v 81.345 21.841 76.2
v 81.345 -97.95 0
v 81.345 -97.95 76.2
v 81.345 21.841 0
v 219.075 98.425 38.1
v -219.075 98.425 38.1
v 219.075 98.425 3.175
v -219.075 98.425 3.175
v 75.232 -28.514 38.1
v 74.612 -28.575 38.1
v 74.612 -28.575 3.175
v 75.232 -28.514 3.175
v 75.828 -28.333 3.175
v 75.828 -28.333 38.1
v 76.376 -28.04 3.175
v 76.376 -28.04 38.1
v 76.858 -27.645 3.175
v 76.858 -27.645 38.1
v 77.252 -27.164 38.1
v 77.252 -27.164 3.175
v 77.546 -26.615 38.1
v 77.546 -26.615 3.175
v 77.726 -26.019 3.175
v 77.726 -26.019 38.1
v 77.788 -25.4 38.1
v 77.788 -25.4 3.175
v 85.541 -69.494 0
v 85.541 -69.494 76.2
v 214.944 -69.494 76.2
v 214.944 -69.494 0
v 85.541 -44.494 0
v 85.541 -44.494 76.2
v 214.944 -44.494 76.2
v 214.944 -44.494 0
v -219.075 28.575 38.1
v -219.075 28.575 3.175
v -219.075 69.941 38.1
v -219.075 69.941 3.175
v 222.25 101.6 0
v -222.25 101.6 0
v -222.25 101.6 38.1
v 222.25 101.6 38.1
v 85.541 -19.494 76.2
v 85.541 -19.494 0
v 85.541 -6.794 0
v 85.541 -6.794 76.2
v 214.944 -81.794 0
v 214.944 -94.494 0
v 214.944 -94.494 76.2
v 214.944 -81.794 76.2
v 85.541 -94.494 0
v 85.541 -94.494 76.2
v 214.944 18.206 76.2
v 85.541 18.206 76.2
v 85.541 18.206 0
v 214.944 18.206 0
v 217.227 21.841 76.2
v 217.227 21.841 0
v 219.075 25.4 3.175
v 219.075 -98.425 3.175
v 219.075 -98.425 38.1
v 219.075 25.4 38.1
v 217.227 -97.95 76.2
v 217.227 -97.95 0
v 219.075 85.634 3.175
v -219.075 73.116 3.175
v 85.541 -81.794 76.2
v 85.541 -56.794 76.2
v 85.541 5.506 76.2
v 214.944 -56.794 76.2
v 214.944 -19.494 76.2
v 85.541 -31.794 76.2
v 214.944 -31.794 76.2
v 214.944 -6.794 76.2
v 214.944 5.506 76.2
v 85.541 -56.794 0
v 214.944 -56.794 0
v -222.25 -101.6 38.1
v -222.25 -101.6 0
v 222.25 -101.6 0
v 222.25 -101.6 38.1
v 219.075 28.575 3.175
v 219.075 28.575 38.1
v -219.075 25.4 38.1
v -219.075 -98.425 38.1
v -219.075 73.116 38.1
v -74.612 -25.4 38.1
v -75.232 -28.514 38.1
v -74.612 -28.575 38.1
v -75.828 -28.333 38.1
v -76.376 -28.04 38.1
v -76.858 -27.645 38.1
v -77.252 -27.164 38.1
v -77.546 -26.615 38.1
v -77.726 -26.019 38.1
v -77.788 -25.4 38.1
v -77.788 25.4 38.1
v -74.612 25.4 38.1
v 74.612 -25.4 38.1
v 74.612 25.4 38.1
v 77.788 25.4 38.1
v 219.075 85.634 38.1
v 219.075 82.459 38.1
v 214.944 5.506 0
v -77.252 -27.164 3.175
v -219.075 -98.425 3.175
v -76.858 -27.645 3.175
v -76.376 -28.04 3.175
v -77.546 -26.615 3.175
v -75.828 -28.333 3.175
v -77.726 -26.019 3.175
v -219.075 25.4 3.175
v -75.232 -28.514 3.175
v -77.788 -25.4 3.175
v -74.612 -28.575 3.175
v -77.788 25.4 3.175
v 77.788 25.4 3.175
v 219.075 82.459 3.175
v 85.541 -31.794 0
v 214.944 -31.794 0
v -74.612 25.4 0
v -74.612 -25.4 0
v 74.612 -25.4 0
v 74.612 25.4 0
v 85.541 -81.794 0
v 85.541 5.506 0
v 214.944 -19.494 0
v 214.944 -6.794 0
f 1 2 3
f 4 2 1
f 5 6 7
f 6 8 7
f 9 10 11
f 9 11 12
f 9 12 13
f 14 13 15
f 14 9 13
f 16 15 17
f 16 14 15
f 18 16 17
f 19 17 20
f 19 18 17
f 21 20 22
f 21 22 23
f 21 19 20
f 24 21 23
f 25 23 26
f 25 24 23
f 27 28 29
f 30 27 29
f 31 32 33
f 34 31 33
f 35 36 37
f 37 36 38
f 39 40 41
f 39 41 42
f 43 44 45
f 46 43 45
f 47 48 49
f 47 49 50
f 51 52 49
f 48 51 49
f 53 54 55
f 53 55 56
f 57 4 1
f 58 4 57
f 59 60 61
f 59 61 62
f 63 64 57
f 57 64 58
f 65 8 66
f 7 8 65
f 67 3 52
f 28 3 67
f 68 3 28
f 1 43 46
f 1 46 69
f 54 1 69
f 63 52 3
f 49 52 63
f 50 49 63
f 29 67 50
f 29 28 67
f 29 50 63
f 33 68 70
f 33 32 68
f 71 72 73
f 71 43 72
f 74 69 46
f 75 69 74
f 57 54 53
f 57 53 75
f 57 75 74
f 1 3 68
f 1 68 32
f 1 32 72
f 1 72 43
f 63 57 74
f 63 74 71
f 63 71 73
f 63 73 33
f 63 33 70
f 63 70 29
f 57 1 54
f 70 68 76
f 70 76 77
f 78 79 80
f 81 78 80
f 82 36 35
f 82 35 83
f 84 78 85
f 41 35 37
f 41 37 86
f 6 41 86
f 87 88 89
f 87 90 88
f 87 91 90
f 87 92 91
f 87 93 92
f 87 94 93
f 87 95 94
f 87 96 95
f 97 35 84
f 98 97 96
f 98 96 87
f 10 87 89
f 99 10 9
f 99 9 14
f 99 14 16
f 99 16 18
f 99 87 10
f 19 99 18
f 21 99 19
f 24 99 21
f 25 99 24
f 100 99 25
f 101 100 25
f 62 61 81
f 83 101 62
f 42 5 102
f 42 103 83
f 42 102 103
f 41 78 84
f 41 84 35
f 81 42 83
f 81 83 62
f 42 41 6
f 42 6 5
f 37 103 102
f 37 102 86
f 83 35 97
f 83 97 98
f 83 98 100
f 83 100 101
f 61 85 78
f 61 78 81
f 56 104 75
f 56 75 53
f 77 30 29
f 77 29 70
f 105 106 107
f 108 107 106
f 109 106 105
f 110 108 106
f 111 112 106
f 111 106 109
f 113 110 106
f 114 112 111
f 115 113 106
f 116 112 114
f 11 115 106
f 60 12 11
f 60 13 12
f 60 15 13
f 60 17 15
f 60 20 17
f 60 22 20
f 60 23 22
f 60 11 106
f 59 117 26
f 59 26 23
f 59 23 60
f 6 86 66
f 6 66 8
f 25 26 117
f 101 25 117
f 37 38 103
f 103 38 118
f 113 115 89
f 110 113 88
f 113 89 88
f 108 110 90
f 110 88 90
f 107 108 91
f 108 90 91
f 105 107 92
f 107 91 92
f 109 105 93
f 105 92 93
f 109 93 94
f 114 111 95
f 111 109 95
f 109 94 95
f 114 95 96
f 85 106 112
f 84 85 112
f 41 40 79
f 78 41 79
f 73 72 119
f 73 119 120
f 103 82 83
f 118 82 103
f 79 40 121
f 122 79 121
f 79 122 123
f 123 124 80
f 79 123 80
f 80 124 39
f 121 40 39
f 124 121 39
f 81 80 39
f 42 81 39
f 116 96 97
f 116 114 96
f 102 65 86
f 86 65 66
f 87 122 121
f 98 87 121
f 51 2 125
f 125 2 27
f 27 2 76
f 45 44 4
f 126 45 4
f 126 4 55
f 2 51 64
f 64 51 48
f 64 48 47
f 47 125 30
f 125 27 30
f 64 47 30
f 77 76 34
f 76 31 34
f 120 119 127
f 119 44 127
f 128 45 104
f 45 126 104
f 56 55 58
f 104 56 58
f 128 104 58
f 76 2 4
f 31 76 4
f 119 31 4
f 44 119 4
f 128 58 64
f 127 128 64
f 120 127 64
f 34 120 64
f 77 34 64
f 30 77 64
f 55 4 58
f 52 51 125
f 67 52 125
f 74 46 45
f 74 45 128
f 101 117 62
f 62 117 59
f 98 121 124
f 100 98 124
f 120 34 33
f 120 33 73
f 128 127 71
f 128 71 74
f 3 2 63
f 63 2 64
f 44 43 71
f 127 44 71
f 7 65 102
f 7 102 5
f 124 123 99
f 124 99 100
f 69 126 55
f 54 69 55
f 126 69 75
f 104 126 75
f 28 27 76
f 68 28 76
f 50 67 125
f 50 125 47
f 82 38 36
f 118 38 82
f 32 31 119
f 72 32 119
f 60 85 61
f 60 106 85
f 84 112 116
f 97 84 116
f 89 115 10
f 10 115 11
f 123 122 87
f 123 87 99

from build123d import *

# Parameters (mm, degrees)
SKETCH_W            = 444.5
SKETCH_H            = 203.2
SKETCH_W_2          = 149.225
SKETCH_H_2          = 50.8
PAD_DEPTH           = 38.1
THICKNESS_T         = -3.175
SKETCH001_W         = 444.5
SKETCH001_H         = 3.175
PAD001_DEPTH        = 38.1
PAD002_DEPTH        = 38.1
SKETCH003_W         = 135.882736
SKETCH003_H         = 119.791347
PAD003_DEPTH        = 76.2
SKETCH004_W         = 129.402947
SKETCH004_H         = 12.7
POCKET_DEPTH        = 76.201
LINEARPATTERN_COUNT = 5
LINEARPATTERN_PITCH = 25.000013


with BuildPart() as bodytray:
    # Sketch → Pad (new body)
    with BuildSketch(Plane.XY):
        Rectangle(SKETCH_W, SKETCH_H)
        Rectangle(SKETCH_W_2, SKETCH_H_2, mode=Mode.SUBTRACT)
    extrude(amount=PAD_DEPTH)

    # Thickness
    thickness_openings = [bodytray.faces().sort_by_distance(p)[0] for p in [
        (0, 96.712562, 38.1),
    ]]
    offset(amount=THICKNESS_T, openings=thickness_openings)

    # Sketch001 → Pad001 (join)
    with BuildSketch(Plane.XY):
        with Locations((0, 26.9875)):
            Rectangle(SKETCH001_W, SKETCH001_H)
    extrude(amount=PAD001_DEPTH)

    # Sketch002 → Pad002 (join)
    with BuildSketch(Plane.XY):
        Polygon((-222.25, 73.025), (-222.25, 69.85), (222.25, 82.55), (222.25, 85.725), align=None)
    extrude(amount=PAD002_DEPTH)


with BuildPart() as bodyplierholder:
    # Sketch003 → Pad003 (new body)
    with BuildSketch(Plane.XY):
        with Locations((149.286034, -38.054498)):
            Rectangle(SKETCH003_W, SKETCH003_H)
    extrude(amount=PAD003_DEPTH)

    # Sketch004 (on Face6 of Pad003) → Pocket (cut, through all)
    with BuildSketch(Plane.XY.offset(76.2)):
        with Locations((150.242259, -88.144416)):
            Rectangle(SKETCH004_W, SKETCH004_H)
    pocket = extrude(amount=-POCKET_DEPTH, mode=Mode.SUBTRACT)

    # LinearPattern: Pocket ×5
    with Locations(*[(0, i * LINEARPATTERN_PITCH, 0) for i in range(1, LINEARPATTERN_COUNT)]):
        add(pocket, mode=Mode.SUBTRACT)


solid = Compound([bodytray.part, bodyplierholder.part])
